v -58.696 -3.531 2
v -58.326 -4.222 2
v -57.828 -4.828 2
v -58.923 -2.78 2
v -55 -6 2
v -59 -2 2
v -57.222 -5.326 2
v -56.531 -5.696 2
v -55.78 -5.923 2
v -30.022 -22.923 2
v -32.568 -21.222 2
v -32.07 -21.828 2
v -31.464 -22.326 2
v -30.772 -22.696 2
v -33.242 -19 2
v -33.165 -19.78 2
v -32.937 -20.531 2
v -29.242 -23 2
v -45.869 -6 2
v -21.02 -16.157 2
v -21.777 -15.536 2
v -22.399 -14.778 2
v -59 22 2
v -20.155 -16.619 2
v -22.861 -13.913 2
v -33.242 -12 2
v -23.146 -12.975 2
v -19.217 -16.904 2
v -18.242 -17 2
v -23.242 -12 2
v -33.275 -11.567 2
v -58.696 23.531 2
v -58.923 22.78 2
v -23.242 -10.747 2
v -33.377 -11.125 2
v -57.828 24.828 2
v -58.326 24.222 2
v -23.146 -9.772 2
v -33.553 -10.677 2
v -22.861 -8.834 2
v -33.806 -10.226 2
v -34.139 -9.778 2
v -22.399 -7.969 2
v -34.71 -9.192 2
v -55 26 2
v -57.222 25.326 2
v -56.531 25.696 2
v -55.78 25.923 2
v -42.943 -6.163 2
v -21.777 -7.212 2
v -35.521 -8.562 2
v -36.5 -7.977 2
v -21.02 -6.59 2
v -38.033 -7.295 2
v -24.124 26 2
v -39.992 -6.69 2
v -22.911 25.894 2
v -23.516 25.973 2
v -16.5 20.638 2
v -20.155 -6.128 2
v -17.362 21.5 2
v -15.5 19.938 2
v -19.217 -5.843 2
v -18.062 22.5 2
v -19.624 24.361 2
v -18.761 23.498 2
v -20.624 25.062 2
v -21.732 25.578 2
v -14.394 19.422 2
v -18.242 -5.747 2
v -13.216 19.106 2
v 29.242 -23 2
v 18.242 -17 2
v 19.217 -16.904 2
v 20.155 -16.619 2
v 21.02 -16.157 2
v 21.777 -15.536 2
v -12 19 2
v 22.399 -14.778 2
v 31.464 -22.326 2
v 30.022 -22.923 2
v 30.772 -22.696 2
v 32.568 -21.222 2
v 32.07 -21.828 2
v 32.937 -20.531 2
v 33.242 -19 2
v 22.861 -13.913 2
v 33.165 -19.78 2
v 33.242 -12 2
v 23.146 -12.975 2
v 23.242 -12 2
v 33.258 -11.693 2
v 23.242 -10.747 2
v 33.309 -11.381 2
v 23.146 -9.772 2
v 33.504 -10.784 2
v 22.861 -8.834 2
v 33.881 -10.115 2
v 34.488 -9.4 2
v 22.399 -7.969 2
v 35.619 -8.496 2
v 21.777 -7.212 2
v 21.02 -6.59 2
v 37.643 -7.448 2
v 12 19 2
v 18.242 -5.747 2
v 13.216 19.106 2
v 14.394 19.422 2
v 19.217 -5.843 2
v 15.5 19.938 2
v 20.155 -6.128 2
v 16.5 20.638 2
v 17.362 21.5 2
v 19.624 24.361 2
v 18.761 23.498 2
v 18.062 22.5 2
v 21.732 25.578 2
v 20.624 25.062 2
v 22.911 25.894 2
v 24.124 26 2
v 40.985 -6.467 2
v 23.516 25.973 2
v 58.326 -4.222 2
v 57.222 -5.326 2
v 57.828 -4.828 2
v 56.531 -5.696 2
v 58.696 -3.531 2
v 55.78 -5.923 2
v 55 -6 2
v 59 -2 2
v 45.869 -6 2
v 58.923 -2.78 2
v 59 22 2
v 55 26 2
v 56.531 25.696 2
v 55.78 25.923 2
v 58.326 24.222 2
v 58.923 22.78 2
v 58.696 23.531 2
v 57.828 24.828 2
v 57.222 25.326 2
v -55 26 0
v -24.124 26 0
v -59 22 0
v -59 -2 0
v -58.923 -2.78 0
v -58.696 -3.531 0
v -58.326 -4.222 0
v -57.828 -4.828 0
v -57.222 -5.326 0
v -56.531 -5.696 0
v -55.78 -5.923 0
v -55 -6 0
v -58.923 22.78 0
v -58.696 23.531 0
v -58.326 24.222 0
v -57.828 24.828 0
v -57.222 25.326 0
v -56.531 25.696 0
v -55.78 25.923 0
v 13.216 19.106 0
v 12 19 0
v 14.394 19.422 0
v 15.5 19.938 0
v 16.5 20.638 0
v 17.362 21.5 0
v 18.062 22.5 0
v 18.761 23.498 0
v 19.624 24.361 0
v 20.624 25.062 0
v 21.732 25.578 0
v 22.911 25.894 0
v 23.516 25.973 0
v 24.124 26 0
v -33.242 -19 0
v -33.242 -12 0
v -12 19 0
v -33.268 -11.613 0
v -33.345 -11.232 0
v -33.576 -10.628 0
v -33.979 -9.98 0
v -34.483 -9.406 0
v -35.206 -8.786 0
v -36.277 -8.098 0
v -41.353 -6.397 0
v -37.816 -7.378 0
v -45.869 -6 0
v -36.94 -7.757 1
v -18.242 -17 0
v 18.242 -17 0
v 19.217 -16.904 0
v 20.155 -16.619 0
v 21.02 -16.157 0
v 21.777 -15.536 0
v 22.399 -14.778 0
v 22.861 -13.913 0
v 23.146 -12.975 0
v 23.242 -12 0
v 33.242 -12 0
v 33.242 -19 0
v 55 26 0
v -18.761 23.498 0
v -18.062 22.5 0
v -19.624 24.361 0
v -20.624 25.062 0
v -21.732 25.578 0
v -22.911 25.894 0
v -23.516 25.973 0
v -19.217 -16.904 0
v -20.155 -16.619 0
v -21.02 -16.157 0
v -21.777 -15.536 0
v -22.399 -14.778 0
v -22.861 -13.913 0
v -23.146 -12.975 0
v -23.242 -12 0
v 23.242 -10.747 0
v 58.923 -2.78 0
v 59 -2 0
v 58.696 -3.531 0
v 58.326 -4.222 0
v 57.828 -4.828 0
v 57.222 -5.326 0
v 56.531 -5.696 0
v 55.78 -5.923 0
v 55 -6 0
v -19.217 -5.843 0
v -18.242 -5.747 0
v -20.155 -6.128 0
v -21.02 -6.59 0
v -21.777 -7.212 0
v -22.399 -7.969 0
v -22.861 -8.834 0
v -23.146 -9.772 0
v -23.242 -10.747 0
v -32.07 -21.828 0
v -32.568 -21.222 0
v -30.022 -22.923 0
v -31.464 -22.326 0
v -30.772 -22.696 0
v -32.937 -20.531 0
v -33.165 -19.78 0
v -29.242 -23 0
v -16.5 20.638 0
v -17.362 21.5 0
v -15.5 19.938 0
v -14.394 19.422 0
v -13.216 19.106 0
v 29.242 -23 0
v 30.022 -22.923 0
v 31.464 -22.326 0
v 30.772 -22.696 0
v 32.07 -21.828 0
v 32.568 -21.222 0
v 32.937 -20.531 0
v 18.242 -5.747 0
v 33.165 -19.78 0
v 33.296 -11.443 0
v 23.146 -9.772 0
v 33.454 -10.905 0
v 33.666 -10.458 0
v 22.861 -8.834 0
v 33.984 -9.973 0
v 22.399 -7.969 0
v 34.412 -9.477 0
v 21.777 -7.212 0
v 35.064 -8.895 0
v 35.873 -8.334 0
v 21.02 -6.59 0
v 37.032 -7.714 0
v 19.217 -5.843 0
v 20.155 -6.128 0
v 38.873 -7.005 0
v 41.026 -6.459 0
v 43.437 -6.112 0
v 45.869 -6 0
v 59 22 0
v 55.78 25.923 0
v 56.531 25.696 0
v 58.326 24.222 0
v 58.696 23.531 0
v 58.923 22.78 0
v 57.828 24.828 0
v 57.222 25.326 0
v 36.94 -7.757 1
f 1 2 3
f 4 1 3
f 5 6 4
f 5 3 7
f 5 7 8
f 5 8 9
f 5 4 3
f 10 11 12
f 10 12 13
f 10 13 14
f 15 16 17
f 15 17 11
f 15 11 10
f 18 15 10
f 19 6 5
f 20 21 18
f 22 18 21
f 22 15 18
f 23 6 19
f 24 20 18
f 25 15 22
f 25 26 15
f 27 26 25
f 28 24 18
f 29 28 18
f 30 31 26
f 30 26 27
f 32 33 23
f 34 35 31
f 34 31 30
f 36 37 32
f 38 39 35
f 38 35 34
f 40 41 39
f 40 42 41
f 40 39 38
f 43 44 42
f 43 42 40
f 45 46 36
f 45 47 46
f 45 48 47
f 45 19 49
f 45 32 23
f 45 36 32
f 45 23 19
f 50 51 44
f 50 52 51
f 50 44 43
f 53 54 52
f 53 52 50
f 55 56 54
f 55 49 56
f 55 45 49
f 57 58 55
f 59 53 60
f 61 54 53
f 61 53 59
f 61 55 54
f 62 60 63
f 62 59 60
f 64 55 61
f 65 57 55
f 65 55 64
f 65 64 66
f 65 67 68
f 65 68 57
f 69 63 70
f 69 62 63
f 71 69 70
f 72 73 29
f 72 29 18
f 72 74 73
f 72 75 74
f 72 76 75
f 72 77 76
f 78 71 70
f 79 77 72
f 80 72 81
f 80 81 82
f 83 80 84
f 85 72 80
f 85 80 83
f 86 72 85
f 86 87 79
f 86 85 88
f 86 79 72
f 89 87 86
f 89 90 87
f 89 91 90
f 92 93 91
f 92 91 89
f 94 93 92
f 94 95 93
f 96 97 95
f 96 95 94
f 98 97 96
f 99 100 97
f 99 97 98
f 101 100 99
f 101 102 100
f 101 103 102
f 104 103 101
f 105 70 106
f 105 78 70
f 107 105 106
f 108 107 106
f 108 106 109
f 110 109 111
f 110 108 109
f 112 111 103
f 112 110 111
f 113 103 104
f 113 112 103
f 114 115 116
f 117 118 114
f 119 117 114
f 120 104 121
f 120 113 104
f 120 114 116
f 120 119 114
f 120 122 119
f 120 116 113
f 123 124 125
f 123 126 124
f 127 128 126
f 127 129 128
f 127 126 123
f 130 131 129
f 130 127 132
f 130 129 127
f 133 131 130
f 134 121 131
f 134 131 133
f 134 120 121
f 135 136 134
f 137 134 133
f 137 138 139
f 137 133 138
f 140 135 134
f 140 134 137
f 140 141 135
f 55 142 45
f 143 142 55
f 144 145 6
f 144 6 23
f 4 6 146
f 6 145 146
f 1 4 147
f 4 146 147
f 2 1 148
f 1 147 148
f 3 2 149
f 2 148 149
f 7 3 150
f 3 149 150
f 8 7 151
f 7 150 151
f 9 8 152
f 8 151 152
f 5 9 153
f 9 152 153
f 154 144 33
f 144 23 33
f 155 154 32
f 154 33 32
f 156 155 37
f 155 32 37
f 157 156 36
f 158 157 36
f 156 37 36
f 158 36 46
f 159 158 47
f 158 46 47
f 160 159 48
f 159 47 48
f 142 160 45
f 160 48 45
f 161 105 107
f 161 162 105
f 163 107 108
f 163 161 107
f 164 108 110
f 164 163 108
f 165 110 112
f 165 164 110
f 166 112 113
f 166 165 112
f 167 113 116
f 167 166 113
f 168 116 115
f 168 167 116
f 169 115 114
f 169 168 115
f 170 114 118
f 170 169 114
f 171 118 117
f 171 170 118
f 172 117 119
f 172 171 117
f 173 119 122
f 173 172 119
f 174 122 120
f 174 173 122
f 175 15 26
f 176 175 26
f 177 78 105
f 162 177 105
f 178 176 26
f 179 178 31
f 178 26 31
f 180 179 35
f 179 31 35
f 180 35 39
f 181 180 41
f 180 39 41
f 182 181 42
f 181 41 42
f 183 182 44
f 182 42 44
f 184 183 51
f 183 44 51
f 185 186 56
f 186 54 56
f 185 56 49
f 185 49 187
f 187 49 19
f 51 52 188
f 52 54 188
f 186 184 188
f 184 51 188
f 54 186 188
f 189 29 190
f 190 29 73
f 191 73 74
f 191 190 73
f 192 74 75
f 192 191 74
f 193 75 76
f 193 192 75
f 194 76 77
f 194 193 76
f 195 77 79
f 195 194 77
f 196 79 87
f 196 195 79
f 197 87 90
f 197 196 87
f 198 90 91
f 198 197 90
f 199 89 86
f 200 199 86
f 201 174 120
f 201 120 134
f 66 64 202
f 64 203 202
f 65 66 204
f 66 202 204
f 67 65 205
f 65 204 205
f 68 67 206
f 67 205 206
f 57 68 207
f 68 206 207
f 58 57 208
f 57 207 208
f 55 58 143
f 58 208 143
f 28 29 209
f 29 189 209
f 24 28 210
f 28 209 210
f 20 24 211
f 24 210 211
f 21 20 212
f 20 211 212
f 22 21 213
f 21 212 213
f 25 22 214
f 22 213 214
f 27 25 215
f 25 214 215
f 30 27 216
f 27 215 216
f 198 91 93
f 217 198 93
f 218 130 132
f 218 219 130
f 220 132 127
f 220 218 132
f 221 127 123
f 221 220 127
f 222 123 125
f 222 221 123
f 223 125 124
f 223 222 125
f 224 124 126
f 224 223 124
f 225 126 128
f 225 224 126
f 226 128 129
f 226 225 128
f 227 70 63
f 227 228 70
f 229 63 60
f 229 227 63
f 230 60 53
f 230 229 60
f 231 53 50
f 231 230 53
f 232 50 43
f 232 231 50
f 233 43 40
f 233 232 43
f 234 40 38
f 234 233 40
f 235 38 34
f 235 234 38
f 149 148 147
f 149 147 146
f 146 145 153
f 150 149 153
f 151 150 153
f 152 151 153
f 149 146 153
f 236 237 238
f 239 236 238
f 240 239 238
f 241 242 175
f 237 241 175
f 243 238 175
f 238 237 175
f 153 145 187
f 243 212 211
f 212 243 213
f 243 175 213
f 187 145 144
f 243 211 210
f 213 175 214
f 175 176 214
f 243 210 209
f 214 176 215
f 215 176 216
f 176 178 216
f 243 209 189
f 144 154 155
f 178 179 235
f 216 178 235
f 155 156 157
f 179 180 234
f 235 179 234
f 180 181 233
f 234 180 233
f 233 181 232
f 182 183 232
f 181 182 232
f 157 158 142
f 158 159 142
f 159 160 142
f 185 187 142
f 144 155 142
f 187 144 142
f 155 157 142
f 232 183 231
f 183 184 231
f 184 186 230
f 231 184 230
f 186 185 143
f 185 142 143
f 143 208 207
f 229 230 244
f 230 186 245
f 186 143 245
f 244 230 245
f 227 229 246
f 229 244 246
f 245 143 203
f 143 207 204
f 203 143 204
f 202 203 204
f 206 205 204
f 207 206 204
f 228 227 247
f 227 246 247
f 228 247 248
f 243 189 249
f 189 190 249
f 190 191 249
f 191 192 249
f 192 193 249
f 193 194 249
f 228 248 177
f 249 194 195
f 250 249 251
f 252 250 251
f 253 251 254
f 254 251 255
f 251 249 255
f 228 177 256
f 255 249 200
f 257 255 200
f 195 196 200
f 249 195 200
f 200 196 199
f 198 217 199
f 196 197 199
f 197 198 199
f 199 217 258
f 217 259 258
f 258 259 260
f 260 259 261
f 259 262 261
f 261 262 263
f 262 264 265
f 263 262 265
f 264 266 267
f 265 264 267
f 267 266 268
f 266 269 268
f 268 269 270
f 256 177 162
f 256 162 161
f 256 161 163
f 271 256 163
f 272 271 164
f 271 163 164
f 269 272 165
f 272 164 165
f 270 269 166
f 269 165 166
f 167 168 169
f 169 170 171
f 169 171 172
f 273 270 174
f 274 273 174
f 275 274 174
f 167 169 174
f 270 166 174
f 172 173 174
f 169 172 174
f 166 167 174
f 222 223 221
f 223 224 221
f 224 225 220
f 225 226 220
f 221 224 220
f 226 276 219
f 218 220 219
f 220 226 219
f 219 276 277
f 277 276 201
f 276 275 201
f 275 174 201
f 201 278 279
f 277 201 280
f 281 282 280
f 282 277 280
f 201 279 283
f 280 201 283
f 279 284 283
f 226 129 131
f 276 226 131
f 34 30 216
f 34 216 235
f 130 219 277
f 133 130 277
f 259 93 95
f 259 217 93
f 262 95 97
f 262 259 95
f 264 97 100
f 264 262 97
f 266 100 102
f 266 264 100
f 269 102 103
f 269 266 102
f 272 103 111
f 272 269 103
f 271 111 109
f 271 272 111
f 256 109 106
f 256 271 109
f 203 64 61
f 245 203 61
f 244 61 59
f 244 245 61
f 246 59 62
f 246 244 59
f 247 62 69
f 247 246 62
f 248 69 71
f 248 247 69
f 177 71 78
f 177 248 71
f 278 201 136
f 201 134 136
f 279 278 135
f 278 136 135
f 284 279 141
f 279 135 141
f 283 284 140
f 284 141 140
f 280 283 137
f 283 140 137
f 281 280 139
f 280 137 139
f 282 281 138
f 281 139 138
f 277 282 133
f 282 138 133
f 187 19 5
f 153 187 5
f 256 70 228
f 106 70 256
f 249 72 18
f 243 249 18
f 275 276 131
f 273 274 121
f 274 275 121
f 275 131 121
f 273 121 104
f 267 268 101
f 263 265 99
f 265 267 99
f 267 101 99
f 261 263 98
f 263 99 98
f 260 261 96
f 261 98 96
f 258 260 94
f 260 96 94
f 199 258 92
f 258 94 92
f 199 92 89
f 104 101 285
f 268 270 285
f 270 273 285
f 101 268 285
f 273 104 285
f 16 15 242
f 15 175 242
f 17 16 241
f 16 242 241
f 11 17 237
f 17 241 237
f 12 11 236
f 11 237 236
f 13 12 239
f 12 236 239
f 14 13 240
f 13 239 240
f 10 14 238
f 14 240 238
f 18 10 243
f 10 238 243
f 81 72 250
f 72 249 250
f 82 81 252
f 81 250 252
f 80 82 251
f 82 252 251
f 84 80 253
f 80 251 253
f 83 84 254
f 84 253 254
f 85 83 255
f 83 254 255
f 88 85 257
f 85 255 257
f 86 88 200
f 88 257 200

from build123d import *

# Parameters (mm, degrees)
SKETCH1_W           = 118
SKETCH1_H           = 52
BOSS_EXTRUDE1_DEPTH = 2
CUT_EXTRUDE1_DEPTH  = 10
SKETCH4_W           = 38
SKETCH4_H           = 7
CUT_EXTRUDE2_DEPTH  = 10
SKETCH5_W           = 46.483490982
SKETCH5_H           = 11.25265215
CUT_EXTRUDE3_DEPTH  = 10
FILLET1_R           = 5
FILLET2_R           = 7
FILLET3_R           = 7
FILLET4_R           = 4
FILLET5_R           = 4


with BuildPart() as part:
    # Sketch1 → Boss-Extrude1 (new body)
    with BuildSketch(Plane.XY):
        Rectangle(SKETCH1_W, SKETCH1_H)
    extrude(amount=BOSS_EXTRUDE1_DEPTH)

    # Sketch3 → Cut-Extrude1 (cut)
    with BuildSketch(Plane.XY.offset(2)):
        with BuildLine():
            Line((-33.241745491, -23), (-33.241745491, -12))
            add(Edge.make_bspline(
                [(-33.241745491, -12), (-33.241745491, -6), (-45.86936562, -6)],
                knots=[3.141592654, 3.141592654, 3.141592654, 4.71238898, 4.71238898, 4.71238898], degree=2, weights=[1, 0.707106781, 1]))
            Line((-45.86936562, -6), (-59, -6))
            Line((-59, -6), (-59, -26))
            Line((-59, -26), (59, -26))
            Line((59, -26), (59, -6))
            Line((59, -6), (45.86936562, -6))
            add(Edge.make_bspline(
                [(45.86936562, -6), (33.241745491, -6), (33.241745491, -12)],
                knots=[1.570796327, 1.570796327, 1.570796327, 3.141592654, 3.141592654, 3.141592654], degree=2, weights=[1, 0.707106781, 1]))
            Line((33.241745491, -12), (33.241745491, -23))
            Line((33.241745491, -23), (-33.241745491, -23))
        make_face()
    extrude(amount=-CUT_EXTRUDE1_DEPTH, mode=Mode.SUBTRACT)

    # Sketch4 → Cut-Extrude2 (cut)
    with BuildSketch(Plane.XY.offset(2)):
        with Locations((0, 22.5)):
            Rectangle(SKETCH4_W, SKETCH4_H)
    extrude(amount=-CUT_EXTRUDE2_DEPTH, mode=Mode.SUBTRACT)

    # Sketch5 → Cut-Extrude3 (cut)
    with BuildSketch(Plane.XY.offset(2)):
        with Locations((0, -11.373673925)):
            Rectangle(SKETCH5_W, SKETCH5_H)
    extrude(amount=-CUT_EXTRUDE3_DEPTH, mode=Mode.SUBTRACT)

    # Fillet1
    fillet1_edges = [part.edges().sort_by_distance(p)[0] for p in [
        (-23.241745491, -17, 1),
        (-23.241745491, -5.74734785, 1),
        (23.241745491, -5.74734785, 1),
        (23.241745491, -17, 1),
    ]]
    fillet(fillet1_edges, radius=FILLET1_R)

    # Fillet2
    fillet2_edges = [part.edges().sort_by_distance(p)[0] for p in [
        (19, 19, 1),
        (-19, 19, 1),
    ]]
    fillet(fillet2_edges, radius=FILLET2_R - 0.0001)  # a hair under: the kernel refuses the full size

    # Fillet3
    fillet3_edges = [part.edges().sort_by_distance(p)[0] for p in [
        (19, 26, 1),
        (-19, 26, 1),
    ]]
    fillet(fillet3_edges, radius=FILLET3_R)

    # Fillet4
    fillet4_edges = [part.edges().sort_by_distance(p)[0] for p in [
        (59, -6, 1),
        (-59, -6, 1),
        (-33.241745491, -23, 1),
        (33.241745491, -23, 1),
    ]]
    fillet(fillet4_edges, radius=FILLET4_R)

    # Fillet5
    fillet5_edges = [part.edges().sort_by_distance(p)[0] for p in [
        (-59, 26, 1),
        (59, 26, 1),
    ]]
    fillet(fillet5_edges, radius=FILLET5_R)


solid = part.part
